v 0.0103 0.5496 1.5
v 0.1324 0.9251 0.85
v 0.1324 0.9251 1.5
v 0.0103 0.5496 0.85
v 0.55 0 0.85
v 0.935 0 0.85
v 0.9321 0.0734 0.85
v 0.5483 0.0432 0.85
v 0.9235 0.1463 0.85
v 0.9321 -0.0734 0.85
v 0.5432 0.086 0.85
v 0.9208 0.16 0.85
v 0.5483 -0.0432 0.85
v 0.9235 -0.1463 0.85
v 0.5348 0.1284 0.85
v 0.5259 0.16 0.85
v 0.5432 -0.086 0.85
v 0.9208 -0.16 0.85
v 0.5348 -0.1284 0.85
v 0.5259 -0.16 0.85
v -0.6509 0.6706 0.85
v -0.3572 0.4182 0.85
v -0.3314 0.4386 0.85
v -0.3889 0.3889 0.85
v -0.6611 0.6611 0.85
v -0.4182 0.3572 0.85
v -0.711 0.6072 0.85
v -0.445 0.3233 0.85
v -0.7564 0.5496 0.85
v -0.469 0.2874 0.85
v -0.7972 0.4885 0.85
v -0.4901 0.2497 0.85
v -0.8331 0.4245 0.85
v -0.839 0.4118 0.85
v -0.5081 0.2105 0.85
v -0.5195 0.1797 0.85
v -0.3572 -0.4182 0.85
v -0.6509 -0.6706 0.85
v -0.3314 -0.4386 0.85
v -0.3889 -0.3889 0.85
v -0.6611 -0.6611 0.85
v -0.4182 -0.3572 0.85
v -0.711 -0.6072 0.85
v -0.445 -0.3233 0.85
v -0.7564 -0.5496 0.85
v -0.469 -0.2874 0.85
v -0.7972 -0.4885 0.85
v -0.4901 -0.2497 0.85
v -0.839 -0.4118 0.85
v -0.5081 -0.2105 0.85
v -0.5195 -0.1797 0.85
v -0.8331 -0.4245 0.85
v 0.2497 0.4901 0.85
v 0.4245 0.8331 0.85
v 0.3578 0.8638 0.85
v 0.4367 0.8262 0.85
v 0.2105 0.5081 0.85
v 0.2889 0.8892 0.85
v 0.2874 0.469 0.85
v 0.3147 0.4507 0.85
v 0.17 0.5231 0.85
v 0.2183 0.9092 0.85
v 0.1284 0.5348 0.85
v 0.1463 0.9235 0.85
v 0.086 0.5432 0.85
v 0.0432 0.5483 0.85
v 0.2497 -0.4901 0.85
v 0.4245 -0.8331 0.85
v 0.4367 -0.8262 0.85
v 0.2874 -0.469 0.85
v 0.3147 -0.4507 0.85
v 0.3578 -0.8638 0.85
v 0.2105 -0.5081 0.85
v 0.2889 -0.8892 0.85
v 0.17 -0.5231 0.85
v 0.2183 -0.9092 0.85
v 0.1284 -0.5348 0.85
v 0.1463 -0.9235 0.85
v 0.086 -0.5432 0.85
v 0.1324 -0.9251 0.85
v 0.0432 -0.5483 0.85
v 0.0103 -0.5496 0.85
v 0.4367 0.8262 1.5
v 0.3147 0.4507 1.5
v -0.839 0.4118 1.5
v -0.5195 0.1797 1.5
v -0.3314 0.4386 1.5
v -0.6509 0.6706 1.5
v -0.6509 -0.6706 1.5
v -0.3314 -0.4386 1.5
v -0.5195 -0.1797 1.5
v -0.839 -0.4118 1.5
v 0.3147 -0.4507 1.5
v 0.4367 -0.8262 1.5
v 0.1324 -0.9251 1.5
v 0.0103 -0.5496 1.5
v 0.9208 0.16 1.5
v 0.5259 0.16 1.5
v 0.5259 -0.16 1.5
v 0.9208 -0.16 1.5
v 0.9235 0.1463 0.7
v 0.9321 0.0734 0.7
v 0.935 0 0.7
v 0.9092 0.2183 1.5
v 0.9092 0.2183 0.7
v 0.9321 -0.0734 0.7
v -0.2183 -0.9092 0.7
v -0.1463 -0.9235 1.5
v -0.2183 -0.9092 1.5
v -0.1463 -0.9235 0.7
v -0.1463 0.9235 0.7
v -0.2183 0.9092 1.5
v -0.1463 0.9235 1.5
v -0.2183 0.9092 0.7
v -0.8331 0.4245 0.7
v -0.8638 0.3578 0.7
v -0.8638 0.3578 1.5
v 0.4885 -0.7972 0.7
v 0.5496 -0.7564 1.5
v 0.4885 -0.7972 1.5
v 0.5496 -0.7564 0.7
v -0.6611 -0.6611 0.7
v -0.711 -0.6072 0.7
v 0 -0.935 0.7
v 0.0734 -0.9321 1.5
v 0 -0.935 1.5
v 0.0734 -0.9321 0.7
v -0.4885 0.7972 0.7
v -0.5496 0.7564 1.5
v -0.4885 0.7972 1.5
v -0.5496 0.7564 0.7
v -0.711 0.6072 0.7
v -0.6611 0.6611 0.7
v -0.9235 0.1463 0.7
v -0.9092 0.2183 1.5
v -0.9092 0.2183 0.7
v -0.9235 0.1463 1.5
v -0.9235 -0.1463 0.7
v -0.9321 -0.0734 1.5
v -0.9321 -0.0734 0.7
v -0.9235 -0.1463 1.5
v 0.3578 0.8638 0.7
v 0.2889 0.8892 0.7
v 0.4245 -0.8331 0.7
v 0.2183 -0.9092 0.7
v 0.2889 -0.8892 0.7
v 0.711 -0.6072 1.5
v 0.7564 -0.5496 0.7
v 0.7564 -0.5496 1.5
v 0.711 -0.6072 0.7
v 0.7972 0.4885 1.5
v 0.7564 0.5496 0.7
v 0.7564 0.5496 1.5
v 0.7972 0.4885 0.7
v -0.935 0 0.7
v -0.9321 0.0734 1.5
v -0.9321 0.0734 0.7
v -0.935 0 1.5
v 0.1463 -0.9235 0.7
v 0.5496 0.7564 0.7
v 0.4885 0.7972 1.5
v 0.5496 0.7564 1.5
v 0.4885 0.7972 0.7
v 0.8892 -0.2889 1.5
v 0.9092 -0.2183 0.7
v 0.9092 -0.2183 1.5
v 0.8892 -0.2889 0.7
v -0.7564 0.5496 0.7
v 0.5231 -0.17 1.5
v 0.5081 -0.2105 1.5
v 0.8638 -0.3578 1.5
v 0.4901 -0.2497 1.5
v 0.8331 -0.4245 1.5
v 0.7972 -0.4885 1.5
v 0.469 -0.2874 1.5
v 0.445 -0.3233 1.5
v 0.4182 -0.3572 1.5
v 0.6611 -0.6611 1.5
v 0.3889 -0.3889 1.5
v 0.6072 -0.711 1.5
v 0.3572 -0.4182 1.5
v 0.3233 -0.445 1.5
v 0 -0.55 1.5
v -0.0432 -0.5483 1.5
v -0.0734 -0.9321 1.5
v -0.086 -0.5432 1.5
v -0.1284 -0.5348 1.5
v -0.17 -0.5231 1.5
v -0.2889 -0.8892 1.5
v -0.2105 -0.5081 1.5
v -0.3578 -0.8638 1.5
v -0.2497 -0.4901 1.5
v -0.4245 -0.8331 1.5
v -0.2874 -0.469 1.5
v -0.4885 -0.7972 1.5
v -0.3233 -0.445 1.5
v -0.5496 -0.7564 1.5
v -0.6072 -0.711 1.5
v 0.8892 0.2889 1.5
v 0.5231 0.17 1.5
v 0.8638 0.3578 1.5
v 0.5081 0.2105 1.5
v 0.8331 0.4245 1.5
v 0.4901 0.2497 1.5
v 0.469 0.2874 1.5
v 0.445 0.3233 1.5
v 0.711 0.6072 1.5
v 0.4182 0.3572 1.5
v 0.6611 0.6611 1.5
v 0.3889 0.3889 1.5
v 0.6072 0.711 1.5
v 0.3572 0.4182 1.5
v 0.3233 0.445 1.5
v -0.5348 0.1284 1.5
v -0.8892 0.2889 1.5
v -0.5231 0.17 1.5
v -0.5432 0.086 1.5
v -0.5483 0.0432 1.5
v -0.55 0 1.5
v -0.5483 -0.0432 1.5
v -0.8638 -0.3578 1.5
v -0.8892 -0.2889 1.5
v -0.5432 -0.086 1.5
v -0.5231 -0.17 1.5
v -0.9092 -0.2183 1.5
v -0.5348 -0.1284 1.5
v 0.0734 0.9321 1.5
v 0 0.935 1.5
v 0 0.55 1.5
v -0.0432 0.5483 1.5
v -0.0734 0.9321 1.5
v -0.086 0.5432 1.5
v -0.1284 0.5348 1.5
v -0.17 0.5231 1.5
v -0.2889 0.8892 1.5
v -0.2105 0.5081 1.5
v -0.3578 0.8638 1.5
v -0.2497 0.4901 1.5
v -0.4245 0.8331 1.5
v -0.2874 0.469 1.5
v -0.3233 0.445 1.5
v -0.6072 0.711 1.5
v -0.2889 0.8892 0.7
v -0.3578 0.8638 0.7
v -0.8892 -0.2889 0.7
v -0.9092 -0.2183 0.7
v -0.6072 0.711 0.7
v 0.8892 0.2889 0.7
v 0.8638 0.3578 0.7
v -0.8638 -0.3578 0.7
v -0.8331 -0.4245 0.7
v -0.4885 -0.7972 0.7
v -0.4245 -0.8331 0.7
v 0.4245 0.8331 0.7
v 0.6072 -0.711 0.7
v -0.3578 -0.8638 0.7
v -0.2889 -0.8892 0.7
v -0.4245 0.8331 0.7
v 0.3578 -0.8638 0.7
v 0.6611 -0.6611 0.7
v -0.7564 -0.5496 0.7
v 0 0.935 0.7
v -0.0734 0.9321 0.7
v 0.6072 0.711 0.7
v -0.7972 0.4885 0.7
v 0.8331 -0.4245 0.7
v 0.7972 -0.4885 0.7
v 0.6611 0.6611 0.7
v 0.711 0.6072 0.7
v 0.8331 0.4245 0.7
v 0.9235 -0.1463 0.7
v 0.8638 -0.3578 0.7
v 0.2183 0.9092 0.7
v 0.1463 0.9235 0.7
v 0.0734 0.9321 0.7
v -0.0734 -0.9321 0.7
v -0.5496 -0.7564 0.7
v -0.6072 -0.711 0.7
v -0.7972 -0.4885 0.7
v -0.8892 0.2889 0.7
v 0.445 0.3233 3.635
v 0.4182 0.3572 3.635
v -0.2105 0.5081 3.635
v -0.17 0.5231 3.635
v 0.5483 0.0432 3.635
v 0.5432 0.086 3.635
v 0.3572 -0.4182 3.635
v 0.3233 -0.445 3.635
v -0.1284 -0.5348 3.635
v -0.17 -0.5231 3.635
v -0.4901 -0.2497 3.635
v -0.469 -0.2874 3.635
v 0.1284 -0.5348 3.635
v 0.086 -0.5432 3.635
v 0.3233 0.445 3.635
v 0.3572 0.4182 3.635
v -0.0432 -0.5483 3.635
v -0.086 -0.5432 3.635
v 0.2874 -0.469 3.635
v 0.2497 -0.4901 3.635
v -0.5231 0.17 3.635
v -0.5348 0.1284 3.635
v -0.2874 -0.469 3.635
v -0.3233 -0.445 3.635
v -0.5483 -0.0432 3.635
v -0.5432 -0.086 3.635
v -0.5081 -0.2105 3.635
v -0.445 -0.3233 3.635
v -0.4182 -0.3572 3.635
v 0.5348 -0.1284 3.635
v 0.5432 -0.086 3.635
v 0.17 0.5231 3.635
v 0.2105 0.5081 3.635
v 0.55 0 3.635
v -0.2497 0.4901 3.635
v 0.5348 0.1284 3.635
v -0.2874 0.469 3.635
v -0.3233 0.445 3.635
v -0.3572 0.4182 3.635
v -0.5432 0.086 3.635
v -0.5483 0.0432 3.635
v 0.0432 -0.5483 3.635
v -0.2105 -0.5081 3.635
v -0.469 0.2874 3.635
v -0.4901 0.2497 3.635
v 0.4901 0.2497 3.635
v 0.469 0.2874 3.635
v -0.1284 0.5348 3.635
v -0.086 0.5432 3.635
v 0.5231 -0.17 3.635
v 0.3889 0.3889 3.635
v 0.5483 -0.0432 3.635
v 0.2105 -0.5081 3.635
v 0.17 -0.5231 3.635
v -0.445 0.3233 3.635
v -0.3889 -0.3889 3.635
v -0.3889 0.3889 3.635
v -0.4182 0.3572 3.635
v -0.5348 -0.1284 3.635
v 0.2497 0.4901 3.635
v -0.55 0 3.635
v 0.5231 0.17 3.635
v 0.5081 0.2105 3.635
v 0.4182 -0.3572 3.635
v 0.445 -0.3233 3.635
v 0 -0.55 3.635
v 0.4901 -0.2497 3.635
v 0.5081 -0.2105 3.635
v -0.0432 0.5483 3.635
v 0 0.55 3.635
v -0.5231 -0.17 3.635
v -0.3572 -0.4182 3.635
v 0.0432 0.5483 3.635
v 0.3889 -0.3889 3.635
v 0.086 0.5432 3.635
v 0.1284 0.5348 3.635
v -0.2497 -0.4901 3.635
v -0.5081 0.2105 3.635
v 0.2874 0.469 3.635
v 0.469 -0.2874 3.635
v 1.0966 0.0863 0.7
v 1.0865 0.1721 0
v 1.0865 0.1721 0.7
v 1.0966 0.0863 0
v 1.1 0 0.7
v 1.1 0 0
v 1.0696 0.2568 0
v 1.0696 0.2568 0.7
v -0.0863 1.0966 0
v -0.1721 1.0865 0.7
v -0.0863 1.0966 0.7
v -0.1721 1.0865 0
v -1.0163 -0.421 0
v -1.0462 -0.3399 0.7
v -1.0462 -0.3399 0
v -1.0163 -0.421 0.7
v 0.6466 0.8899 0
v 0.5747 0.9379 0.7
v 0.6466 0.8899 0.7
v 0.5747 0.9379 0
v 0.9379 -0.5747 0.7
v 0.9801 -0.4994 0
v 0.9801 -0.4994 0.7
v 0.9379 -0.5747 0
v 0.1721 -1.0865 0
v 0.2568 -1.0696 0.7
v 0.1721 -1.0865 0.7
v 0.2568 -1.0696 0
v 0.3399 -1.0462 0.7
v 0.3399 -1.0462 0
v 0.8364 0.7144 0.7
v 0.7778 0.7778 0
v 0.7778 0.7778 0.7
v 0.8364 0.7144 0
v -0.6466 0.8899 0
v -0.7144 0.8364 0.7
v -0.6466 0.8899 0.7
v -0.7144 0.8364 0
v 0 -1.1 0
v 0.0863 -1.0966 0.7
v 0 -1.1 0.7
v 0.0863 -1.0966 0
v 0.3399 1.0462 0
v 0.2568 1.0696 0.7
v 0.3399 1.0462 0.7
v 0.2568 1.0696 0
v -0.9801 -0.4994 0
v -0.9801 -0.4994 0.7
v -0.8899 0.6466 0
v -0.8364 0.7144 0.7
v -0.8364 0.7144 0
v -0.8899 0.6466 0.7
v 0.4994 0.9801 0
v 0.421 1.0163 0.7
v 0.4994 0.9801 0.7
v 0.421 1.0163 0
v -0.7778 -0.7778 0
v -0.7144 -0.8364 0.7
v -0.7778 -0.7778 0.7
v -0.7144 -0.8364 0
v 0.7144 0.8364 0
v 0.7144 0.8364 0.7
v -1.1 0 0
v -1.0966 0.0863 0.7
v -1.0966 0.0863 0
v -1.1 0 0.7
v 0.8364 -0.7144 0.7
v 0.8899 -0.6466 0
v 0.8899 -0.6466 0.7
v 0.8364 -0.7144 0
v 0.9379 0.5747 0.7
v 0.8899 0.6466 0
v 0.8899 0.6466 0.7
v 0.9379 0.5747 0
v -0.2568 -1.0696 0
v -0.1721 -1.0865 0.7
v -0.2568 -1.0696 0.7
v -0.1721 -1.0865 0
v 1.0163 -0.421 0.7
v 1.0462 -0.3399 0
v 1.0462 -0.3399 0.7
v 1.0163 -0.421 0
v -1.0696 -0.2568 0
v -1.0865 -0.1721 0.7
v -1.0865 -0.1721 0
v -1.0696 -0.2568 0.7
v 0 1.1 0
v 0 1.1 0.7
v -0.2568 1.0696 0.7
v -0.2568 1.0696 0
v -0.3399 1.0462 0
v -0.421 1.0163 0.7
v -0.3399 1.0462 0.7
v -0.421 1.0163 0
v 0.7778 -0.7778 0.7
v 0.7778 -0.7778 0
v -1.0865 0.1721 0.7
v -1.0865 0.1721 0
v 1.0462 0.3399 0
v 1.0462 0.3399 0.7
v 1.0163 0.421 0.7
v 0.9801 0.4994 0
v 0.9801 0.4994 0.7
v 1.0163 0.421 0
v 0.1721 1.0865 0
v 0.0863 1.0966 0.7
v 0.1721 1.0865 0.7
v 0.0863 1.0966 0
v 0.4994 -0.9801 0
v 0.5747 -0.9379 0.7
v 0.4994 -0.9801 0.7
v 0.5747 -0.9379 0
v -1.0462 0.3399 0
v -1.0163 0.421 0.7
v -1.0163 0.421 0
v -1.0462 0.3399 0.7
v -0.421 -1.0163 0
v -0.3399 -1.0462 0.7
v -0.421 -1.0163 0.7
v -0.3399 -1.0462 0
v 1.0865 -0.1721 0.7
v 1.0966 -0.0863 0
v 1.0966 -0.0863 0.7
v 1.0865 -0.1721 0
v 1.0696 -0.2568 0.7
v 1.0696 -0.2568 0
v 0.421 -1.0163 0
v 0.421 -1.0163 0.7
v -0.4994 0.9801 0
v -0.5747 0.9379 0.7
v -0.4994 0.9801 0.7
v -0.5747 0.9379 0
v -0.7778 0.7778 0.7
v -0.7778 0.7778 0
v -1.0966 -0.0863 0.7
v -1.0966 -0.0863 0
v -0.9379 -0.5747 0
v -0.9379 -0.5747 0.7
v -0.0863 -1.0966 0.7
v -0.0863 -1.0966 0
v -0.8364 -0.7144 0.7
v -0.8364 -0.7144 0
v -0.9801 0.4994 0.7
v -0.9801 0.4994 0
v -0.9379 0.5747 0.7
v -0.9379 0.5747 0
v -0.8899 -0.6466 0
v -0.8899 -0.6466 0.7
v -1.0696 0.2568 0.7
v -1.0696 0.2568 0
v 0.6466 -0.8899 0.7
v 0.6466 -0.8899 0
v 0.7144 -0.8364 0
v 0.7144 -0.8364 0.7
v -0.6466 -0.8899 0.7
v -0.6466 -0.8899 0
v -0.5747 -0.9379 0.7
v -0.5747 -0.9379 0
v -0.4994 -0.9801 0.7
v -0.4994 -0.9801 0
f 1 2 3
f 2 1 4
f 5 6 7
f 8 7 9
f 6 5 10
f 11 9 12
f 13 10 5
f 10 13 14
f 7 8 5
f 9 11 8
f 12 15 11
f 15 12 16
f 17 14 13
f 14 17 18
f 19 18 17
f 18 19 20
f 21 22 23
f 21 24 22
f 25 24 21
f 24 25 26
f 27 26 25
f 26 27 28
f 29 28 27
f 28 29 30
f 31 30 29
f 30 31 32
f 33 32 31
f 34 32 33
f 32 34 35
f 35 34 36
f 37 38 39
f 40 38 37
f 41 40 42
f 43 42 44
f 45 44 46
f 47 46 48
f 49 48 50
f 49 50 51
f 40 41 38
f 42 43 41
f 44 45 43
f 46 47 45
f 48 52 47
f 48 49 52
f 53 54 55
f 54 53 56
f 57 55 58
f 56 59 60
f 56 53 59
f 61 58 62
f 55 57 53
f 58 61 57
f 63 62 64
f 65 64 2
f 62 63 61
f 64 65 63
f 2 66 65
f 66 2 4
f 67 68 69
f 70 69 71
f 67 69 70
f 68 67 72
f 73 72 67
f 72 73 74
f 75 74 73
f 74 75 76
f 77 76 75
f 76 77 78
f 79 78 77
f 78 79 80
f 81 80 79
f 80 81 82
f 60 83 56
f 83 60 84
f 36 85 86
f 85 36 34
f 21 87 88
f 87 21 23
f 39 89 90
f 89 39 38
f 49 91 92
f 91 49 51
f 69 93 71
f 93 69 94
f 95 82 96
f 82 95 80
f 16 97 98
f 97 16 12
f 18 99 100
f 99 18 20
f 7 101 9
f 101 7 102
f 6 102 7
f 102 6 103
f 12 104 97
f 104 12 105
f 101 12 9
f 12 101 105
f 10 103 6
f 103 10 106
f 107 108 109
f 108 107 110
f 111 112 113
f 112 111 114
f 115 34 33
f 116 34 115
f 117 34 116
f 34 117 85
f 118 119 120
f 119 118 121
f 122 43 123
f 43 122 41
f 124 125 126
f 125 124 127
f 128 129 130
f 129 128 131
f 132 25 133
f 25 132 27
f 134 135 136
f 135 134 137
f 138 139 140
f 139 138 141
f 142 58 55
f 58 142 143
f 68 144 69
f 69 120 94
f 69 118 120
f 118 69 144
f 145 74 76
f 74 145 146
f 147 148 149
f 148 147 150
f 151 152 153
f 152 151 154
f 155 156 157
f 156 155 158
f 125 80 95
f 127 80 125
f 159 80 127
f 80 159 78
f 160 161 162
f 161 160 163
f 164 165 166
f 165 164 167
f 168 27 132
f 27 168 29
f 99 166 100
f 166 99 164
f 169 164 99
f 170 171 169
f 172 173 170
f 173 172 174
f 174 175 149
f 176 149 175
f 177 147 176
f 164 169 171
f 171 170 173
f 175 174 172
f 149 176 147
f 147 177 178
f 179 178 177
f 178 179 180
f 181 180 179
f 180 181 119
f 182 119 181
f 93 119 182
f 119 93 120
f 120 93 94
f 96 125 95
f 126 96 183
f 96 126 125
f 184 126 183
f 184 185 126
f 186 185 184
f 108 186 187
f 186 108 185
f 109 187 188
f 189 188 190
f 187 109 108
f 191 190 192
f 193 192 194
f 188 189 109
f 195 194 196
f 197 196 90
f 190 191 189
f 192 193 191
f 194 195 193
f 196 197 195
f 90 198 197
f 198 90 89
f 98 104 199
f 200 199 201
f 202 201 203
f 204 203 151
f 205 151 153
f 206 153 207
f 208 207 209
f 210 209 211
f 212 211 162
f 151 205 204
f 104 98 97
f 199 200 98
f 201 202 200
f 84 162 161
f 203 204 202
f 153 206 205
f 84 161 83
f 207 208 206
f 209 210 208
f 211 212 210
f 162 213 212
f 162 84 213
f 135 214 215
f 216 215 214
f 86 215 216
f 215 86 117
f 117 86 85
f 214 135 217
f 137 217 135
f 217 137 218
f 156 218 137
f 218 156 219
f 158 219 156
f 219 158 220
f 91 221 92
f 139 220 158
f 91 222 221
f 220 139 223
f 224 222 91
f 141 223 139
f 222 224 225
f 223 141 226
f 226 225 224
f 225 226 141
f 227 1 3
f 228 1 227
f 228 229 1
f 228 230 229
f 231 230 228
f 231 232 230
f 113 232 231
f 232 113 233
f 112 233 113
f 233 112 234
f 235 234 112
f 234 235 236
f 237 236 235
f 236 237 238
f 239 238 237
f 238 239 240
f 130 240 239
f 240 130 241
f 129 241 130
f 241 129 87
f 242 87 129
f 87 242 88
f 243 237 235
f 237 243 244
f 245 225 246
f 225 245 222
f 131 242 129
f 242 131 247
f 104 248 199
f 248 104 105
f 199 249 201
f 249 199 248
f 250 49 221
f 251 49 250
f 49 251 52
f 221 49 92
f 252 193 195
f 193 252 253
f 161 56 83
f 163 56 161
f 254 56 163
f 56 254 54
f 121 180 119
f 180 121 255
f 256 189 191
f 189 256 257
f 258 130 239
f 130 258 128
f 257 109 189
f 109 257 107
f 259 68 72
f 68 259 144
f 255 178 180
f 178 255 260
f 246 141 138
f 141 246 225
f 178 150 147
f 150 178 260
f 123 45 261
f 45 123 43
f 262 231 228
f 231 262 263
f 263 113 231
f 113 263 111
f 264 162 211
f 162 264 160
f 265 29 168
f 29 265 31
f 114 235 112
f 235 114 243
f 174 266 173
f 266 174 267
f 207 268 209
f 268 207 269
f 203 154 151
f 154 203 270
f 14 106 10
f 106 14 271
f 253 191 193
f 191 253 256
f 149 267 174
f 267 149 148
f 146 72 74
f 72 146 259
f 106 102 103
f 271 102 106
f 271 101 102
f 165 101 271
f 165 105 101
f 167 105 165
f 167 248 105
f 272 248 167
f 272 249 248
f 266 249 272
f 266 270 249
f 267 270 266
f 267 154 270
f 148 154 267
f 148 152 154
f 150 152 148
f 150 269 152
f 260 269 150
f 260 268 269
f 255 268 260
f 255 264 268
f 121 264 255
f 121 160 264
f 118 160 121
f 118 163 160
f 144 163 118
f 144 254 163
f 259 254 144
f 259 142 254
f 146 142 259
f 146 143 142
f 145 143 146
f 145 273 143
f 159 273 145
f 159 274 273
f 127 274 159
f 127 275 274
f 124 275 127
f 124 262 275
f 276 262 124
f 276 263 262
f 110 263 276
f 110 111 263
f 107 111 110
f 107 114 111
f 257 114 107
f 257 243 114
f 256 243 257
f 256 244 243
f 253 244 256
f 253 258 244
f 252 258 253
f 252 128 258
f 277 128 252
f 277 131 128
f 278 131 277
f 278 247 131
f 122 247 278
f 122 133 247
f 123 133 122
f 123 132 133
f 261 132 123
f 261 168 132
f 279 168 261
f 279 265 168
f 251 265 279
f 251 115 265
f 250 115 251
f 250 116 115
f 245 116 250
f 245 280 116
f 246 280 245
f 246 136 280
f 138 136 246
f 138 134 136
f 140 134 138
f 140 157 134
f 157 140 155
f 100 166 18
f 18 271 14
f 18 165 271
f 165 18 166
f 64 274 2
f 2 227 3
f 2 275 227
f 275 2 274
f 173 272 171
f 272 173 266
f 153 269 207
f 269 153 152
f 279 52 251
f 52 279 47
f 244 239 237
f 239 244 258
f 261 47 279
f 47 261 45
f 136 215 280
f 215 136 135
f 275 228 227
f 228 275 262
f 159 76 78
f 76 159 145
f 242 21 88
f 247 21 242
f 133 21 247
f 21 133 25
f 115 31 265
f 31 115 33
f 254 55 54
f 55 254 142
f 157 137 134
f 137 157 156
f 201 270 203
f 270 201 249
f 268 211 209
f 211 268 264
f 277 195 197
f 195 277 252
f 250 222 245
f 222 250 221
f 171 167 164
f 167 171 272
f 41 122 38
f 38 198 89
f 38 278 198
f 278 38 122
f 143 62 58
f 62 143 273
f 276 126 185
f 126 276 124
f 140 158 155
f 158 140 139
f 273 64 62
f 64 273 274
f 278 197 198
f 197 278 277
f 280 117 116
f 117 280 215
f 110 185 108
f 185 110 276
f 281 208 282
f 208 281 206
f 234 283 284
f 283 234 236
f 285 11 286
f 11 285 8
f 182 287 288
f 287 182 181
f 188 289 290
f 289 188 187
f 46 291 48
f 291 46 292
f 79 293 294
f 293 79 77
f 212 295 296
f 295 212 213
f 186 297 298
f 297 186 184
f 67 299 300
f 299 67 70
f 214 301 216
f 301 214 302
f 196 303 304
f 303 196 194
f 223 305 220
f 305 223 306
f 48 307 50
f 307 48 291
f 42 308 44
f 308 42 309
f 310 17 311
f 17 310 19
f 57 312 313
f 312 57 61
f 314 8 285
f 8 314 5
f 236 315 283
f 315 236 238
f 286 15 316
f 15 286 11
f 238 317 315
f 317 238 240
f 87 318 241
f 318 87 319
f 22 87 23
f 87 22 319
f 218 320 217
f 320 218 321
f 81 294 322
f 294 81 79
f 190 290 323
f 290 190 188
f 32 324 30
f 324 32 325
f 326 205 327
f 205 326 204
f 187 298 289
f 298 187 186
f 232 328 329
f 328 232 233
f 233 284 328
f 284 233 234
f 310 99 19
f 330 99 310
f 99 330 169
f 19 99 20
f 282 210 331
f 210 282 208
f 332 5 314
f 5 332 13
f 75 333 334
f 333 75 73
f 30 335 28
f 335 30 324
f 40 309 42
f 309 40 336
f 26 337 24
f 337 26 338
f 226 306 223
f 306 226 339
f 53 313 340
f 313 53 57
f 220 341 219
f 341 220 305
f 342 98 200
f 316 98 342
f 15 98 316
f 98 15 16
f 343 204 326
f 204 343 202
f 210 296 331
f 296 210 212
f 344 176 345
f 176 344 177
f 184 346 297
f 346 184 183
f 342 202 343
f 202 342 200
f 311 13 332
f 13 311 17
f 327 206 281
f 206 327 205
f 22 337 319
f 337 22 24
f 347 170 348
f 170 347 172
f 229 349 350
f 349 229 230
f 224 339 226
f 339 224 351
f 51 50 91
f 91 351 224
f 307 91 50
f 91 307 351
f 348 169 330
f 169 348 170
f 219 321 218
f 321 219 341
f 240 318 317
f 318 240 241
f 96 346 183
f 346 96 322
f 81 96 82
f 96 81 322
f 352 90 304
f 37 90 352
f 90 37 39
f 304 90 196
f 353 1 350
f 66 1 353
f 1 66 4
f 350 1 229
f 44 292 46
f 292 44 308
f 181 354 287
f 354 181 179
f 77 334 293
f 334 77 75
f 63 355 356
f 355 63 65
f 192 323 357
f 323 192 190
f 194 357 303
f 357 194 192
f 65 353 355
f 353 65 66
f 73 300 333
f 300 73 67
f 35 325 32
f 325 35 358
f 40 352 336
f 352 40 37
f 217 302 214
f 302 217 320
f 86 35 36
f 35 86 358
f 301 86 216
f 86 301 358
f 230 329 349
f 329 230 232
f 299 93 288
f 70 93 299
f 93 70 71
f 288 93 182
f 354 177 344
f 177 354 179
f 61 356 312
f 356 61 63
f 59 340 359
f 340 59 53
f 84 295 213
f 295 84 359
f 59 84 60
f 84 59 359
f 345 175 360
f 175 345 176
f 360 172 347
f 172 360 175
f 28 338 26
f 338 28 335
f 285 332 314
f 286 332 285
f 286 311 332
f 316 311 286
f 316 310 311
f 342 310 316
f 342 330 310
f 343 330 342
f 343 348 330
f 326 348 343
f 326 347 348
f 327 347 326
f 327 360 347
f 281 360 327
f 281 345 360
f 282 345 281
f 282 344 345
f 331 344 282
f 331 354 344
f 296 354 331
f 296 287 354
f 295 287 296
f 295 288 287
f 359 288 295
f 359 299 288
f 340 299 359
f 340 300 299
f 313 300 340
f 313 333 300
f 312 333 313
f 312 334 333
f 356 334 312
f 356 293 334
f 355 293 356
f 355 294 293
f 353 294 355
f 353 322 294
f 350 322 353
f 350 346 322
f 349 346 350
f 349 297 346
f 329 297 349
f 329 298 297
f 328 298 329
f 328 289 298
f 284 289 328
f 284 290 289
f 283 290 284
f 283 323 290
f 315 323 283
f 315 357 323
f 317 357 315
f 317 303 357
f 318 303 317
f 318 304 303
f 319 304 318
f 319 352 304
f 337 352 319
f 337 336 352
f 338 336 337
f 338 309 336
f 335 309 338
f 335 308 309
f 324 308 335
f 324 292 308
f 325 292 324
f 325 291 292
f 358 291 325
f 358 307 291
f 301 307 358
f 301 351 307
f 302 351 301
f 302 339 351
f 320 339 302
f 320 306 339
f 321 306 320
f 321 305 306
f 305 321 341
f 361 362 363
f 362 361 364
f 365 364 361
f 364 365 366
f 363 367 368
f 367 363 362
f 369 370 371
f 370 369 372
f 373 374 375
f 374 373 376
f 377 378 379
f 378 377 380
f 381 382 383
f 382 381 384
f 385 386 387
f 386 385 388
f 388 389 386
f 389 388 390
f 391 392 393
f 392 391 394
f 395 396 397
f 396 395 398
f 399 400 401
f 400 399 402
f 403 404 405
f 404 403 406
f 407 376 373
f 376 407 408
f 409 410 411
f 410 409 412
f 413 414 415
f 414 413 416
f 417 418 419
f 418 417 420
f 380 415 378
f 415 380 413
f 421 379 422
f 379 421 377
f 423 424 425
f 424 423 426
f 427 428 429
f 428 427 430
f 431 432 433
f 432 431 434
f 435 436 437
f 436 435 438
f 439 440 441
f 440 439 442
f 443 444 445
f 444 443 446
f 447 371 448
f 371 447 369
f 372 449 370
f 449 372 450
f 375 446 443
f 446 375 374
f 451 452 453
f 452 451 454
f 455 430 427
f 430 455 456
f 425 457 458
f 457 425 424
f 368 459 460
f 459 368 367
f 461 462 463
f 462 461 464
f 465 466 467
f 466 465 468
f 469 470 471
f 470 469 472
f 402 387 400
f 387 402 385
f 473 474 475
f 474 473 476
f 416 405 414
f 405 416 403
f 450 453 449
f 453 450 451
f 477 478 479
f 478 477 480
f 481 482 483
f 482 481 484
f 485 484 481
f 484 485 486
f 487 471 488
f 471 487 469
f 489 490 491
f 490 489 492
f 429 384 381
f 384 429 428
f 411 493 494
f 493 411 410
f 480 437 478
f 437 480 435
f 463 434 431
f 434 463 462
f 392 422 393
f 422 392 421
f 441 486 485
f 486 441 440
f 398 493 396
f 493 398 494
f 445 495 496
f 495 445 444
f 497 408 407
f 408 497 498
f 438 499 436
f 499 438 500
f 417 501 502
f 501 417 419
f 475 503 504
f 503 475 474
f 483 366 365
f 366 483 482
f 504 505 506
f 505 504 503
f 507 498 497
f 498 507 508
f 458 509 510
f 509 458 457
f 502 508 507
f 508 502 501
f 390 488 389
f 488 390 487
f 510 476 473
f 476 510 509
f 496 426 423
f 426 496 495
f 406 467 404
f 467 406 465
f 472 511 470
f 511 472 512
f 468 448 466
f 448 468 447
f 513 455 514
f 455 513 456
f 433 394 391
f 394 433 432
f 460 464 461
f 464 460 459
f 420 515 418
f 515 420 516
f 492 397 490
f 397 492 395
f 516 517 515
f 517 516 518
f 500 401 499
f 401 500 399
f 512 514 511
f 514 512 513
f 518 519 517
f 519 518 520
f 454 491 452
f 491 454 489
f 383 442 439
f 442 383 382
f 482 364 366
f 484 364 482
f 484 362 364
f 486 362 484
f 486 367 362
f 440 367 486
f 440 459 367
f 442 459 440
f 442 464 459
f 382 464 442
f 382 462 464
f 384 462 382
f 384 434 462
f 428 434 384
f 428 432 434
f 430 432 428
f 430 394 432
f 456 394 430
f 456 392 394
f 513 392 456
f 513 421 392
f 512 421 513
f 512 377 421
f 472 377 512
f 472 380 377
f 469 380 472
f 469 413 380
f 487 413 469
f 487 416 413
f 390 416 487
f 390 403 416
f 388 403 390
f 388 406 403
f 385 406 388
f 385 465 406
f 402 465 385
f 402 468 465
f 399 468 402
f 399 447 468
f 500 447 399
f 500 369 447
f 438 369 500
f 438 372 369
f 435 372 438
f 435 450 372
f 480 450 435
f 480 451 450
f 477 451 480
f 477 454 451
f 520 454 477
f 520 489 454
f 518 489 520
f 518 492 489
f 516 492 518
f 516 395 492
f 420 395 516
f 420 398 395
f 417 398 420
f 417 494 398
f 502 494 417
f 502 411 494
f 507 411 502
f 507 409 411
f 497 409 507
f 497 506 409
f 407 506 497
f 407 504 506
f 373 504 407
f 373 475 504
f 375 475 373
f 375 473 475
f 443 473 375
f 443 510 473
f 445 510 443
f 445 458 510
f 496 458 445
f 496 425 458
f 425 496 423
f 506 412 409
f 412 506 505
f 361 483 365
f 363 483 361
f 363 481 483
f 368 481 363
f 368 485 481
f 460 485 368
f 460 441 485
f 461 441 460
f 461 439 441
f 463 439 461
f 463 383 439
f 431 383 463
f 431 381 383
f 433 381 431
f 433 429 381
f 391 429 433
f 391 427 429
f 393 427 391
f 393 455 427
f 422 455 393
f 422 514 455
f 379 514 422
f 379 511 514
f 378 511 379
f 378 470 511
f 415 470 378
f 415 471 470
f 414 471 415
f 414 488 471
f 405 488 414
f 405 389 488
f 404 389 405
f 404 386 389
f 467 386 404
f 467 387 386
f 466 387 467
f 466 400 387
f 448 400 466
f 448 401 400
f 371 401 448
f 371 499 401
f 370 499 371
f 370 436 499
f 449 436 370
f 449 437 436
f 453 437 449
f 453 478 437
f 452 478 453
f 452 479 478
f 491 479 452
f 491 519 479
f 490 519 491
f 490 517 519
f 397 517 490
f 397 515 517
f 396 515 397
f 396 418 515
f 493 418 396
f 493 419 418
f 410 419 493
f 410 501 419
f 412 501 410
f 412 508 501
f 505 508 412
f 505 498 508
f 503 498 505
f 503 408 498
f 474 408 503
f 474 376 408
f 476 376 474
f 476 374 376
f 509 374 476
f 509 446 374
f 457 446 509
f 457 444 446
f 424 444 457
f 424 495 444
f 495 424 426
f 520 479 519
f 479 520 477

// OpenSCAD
r1 = 2.2/2;
height1=0.7;

r2=1.87/2;
height2=0.8;

r3=1.1/2;
height3=2+r2;

$fn=80;
cylinder(height1, r1, r1);

translate([0, 0, height1]){
    difference(){
        cylinder(height2, r2, r2);
        translate([0, 0, 0.15]){
            for(i=[1:5]){
                rotate([0, 0, (360/5)*i]){
                    translate([r2/2, 0, height2/2]){
                        cube([r2, 0.32, height2], center=true);
                    }
                }
            }
        }
    }
        cylinder(height3, r3, r3);
}
